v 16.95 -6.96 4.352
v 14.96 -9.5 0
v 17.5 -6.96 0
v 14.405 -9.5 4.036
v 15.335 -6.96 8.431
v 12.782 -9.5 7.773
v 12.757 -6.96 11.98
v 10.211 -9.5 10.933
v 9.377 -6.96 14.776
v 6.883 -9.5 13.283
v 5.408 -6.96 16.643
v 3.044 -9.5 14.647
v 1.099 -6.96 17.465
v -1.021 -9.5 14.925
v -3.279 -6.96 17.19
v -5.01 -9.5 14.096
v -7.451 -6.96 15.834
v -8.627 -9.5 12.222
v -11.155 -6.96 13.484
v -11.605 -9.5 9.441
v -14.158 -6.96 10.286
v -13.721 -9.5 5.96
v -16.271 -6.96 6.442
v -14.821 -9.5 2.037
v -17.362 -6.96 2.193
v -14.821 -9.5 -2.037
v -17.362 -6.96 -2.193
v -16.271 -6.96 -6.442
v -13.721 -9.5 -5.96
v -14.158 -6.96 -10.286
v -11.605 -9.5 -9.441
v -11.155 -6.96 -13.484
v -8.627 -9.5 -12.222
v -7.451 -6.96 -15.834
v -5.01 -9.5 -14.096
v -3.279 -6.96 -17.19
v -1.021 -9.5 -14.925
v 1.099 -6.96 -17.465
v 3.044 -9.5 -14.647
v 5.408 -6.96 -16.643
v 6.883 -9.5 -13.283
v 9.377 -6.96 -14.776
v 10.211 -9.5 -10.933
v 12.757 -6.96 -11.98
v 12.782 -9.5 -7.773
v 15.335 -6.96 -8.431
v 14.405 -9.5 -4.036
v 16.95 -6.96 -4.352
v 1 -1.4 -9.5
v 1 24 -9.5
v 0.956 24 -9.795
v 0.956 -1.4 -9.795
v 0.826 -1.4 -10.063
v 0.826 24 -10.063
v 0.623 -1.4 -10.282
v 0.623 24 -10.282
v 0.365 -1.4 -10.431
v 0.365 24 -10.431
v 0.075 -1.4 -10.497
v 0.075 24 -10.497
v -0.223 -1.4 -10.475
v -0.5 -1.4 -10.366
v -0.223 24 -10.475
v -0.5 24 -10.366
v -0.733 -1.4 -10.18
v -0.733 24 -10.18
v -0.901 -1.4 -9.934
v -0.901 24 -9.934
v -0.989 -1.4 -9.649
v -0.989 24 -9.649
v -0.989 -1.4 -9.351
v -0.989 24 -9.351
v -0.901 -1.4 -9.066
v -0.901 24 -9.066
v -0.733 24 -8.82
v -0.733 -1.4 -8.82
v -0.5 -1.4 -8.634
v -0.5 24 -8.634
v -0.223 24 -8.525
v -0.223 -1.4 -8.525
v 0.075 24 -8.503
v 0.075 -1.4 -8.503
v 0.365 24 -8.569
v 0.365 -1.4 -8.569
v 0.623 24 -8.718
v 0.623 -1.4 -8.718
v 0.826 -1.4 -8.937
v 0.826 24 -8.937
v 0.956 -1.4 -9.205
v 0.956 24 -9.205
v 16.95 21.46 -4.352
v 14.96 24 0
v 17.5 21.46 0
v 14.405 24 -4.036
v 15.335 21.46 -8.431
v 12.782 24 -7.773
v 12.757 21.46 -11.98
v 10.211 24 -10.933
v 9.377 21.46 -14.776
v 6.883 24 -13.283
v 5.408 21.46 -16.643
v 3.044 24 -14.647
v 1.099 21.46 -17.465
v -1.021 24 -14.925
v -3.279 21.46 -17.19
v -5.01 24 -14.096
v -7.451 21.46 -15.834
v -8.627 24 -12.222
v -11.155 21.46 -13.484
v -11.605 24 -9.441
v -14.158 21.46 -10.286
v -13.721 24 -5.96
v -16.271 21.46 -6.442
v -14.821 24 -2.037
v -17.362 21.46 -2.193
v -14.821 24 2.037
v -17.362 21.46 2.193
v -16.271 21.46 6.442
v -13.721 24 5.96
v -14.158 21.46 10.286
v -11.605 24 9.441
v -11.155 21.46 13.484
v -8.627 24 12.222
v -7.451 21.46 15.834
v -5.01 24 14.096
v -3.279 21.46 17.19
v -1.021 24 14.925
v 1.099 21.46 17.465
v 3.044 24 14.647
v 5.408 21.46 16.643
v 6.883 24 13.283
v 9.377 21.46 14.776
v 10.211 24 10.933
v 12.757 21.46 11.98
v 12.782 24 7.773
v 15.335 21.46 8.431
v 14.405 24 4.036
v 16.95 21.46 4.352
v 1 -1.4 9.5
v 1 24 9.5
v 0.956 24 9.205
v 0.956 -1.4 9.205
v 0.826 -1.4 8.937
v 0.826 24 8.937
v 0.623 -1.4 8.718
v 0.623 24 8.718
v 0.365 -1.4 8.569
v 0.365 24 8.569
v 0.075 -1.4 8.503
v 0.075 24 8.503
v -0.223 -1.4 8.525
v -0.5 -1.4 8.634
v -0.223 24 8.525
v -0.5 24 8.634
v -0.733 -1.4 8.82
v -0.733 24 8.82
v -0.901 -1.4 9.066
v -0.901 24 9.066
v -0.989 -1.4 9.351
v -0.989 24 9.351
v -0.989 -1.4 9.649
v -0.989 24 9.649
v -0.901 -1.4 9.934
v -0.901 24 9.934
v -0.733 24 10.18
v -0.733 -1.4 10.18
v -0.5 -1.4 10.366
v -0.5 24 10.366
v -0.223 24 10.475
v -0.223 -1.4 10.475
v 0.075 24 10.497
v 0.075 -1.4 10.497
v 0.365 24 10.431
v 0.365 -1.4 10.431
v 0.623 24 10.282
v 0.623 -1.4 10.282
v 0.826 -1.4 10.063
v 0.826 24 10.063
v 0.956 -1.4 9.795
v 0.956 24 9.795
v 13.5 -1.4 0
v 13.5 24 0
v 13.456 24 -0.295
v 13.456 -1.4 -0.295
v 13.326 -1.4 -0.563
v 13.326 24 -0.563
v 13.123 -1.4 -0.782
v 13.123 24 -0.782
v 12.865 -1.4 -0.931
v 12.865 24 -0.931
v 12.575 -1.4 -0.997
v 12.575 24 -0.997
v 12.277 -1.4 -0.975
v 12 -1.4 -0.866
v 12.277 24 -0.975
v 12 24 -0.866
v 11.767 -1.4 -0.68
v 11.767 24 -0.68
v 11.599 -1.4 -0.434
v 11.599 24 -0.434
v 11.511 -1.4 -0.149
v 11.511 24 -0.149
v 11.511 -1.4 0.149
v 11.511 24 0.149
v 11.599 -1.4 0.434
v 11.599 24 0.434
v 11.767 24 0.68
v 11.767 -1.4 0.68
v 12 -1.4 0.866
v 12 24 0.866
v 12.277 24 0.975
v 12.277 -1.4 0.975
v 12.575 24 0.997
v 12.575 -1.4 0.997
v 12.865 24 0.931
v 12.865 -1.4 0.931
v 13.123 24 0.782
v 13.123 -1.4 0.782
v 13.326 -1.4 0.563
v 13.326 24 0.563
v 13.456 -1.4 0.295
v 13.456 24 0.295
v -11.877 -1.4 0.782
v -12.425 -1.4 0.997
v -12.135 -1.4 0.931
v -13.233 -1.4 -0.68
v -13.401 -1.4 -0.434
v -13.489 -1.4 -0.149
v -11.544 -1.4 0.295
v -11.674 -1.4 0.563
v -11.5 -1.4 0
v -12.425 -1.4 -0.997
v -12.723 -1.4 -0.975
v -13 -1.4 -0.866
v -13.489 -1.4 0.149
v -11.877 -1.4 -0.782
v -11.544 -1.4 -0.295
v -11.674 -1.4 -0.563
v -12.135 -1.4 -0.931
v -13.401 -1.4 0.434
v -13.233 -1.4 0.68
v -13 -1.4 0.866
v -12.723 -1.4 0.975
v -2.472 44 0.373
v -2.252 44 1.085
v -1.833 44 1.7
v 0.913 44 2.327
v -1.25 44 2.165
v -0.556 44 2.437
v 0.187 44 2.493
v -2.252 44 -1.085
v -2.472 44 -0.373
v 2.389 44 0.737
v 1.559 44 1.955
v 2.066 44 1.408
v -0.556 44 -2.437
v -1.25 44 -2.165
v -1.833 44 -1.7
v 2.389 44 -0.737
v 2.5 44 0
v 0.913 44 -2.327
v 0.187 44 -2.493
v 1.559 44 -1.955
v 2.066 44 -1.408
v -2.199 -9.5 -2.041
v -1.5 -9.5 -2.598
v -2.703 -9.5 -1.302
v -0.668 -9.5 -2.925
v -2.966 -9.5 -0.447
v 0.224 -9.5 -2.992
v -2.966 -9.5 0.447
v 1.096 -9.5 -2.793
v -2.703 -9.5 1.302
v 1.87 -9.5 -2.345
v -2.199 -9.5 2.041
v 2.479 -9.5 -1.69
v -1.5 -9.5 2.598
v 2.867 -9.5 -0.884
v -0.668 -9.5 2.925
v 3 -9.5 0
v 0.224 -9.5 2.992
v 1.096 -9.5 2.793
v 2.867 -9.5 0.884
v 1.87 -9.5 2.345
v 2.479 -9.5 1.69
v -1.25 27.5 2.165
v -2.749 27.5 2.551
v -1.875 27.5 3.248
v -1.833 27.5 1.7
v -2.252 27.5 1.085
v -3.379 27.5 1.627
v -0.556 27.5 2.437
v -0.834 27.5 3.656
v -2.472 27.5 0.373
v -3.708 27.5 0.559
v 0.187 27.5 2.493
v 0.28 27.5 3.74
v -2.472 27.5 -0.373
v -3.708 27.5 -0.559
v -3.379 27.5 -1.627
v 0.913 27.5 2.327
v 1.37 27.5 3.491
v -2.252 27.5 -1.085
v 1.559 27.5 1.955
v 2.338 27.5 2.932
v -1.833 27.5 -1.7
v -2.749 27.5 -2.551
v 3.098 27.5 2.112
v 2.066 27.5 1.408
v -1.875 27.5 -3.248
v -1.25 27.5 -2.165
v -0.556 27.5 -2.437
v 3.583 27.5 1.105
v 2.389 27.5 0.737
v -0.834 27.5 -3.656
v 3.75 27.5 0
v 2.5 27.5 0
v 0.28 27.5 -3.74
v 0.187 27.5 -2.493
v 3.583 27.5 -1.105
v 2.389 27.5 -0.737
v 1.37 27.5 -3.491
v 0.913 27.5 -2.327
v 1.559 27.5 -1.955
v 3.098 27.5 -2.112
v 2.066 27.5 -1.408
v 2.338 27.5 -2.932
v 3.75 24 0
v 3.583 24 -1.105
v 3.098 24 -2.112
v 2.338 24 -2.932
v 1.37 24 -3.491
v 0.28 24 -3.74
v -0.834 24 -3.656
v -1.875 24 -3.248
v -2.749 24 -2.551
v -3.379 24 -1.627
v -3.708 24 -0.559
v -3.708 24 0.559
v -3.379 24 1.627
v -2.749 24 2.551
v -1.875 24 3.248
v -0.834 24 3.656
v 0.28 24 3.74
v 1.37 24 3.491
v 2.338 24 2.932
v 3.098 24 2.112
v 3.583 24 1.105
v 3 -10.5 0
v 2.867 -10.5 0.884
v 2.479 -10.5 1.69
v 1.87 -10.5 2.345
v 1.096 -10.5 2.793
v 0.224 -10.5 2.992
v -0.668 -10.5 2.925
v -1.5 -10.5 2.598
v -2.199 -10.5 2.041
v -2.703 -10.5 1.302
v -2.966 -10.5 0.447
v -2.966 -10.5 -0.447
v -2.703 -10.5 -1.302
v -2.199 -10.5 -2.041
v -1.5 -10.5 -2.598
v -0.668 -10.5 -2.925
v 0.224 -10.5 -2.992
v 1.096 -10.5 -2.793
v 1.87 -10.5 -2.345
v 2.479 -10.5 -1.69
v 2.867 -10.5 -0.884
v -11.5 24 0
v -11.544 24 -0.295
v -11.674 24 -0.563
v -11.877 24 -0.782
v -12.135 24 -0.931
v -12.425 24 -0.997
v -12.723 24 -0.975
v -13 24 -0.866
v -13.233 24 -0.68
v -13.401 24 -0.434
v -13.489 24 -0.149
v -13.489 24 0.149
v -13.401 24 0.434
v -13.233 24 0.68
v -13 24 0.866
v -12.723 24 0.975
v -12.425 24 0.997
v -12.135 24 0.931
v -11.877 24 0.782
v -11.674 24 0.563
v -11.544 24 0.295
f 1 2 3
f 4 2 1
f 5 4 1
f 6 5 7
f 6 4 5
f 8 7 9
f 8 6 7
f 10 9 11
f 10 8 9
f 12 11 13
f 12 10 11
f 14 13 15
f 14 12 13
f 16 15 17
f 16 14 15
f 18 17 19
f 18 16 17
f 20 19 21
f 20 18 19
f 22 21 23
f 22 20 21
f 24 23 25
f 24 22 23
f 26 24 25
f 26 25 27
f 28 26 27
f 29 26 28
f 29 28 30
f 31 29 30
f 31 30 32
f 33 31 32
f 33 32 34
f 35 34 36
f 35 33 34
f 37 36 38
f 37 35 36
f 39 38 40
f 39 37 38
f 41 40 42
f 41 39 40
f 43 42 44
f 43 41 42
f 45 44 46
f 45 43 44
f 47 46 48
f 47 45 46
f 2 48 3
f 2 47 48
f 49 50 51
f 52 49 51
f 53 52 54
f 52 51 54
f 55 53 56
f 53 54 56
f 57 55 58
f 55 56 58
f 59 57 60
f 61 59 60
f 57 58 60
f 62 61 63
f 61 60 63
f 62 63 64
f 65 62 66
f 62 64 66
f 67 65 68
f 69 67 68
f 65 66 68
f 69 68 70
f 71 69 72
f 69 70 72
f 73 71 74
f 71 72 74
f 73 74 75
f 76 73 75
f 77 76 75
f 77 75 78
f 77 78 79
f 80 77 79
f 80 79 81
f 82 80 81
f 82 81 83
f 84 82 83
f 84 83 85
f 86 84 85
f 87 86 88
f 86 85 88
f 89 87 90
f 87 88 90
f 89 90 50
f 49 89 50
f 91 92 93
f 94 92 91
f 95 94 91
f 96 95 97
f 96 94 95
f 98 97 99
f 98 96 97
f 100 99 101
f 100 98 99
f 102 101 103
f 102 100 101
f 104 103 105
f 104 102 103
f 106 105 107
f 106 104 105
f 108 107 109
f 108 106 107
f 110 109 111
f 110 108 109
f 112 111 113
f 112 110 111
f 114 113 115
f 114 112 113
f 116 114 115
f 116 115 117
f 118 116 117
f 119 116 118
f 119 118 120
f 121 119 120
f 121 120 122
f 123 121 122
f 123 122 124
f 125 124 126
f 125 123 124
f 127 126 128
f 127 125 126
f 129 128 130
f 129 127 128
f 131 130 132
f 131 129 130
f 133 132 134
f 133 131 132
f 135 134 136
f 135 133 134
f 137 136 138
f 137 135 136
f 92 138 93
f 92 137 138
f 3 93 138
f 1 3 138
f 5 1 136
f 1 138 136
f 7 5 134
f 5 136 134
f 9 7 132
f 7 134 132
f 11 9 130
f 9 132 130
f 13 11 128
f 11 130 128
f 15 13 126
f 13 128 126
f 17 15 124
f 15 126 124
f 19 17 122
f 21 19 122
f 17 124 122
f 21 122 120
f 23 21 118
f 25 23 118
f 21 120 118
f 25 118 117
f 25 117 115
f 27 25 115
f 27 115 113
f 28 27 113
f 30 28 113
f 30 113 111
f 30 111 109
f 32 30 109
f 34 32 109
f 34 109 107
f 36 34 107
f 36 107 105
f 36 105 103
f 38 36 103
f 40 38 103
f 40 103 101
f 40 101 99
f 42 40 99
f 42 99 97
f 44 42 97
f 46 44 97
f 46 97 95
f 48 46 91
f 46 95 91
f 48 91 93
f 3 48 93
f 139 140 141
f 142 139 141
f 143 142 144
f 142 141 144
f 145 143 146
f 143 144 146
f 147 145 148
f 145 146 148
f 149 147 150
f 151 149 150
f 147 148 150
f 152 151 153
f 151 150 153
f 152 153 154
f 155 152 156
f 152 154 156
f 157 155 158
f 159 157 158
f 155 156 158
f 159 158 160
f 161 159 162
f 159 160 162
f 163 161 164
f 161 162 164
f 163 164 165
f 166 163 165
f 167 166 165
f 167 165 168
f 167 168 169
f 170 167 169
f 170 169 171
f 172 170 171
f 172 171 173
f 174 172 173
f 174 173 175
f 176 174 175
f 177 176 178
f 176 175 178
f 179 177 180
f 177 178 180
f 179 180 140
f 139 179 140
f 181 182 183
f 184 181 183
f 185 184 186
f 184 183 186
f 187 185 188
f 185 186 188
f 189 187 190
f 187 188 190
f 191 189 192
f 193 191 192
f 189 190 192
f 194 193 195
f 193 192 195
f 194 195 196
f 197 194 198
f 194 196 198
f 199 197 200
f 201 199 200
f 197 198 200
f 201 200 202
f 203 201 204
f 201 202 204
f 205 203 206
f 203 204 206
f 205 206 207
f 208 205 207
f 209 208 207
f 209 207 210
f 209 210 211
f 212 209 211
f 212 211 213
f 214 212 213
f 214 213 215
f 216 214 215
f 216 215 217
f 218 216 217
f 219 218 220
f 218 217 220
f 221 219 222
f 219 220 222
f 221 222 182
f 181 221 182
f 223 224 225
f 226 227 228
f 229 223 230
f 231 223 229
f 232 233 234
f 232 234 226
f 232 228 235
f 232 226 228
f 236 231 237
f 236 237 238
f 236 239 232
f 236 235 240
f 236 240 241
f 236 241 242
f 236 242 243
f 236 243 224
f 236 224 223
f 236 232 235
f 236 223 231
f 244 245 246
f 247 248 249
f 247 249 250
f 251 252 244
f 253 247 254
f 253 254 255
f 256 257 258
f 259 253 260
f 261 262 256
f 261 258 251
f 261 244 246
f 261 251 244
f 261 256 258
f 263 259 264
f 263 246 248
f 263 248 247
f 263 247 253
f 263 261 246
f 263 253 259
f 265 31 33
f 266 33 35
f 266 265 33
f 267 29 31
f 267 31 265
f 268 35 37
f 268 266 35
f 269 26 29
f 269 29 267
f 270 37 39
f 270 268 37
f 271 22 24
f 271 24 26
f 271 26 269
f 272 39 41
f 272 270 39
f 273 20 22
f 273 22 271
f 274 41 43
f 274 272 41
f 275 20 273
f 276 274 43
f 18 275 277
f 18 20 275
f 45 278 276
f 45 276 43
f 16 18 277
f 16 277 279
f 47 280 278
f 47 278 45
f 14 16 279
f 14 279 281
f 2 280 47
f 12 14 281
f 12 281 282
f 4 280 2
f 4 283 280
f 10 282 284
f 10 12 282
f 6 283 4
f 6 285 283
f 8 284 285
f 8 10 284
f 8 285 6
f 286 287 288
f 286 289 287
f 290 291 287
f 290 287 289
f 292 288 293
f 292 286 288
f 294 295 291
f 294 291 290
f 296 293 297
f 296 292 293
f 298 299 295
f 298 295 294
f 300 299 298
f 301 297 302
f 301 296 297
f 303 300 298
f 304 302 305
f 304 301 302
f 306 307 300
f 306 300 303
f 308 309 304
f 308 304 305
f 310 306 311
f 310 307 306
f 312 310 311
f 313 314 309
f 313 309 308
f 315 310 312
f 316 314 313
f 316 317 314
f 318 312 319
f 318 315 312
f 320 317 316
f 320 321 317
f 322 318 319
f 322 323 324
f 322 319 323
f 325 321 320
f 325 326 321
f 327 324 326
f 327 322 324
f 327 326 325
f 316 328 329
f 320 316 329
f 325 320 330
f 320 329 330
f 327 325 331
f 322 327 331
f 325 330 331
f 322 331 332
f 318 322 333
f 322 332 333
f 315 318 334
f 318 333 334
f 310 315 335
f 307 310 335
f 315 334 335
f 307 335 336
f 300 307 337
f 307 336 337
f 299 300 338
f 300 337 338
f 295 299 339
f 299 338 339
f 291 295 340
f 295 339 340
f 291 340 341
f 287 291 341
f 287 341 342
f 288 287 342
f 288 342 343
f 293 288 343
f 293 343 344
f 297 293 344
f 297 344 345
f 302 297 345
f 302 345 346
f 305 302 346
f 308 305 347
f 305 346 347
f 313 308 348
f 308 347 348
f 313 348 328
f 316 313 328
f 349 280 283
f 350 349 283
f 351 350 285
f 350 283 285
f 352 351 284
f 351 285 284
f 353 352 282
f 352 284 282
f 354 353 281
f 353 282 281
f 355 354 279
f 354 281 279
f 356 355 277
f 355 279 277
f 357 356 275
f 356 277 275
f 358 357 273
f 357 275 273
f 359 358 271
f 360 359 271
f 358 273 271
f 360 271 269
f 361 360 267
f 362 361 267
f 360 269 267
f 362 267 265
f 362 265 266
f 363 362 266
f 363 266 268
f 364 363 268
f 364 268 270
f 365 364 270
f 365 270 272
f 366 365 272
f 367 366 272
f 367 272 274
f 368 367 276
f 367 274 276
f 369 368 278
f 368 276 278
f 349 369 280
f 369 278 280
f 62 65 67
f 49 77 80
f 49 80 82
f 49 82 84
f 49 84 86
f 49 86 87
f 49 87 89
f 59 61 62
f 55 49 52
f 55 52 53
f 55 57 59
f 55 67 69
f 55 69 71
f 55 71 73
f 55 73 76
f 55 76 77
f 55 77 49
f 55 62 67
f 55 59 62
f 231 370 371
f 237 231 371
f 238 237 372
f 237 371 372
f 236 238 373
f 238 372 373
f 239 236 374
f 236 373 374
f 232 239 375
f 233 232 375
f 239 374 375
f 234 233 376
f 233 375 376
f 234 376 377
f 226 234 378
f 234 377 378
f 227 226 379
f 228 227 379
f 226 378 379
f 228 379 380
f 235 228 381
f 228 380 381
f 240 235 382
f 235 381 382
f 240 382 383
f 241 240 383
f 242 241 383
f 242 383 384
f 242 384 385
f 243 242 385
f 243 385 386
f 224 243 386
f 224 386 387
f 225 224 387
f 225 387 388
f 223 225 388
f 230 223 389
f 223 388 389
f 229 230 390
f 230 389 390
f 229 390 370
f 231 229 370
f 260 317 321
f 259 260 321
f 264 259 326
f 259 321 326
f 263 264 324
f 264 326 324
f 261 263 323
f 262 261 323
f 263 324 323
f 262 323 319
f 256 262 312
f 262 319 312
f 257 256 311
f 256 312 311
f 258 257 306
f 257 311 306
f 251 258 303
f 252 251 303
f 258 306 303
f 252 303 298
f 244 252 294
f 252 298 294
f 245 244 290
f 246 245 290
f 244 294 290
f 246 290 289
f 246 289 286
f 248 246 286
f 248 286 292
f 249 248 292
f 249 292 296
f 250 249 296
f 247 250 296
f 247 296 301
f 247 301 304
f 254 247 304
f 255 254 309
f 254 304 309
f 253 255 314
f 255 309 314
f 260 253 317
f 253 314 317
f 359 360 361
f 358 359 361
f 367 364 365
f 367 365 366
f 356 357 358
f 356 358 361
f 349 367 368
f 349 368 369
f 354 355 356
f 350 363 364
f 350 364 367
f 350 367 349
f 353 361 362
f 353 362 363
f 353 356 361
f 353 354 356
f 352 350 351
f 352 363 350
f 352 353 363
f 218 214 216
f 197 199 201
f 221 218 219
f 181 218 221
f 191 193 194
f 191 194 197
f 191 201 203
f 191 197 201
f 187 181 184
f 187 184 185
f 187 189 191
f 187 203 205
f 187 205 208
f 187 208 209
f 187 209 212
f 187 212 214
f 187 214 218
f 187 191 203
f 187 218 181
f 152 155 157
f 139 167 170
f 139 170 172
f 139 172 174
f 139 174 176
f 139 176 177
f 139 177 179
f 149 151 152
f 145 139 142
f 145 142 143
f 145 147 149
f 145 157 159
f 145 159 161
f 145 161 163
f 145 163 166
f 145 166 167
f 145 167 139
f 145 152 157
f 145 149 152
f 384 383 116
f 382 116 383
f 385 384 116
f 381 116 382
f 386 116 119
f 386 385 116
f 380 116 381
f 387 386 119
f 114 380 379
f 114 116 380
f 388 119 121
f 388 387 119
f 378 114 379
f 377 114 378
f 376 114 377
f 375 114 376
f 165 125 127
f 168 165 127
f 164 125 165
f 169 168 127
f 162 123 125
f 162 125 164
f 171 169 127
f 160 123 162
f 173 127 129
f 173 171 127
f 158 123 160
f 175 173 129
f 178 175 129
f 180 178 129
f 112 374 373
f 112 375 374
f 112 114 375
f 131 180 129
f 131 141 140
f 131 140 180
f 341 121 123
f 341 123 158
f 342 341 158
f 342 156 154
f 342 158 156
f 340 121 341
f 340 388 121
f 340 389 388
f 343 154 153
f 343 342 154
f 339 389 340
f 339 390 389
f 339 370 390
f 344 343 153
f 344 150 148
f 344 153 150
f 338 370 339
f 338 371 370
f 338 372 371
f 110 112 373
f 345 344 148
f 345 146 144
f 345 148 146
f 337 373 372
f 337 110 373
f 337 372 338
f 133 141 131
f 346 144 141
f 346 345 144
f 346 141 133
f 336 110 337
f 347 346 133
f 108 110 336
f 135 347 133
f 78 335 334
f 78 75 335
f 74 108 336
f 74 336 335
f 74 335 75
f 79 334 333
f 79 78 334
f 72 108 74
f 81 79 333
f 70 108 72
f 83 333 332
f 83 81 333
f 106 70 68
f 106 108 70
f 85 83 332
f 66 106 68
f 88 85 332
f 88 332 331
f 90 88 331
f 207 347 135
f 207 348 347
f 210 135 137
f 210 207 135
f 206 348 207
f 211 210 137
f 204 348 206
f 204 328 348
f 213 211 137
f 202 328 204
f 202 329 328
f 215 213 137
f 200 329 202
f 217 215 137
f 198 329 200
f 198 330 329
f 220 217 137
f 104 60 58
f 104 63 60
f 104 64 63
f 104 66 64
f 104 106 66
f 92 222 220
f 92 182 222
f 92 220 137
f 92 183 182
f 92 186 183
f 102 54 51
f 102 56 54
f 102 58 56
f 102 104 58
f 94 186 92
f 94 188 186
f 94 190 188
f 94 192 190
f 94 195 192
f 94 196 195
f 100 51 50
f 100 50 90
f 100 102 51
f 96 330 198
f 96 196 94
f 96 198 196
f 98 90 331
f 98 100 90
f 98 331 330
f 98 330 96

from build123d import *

# Parameters (mm, degrees)
SKETCH1_R           = 17.5
BOSS_EXTRUDE1_DEPTH = 24
SKETCH2_R           = 3.75
BOSS_EXTRUDE2_DEPTH = 3.5
SKETCH3_R           = 2.5
BOSS_EXTRUDE3_DEPTH = 16.5
CHAMFER1_SIZE       = 2.54
SKETCH5_R           = 17.5
BOSS_EXTRUDE4_DEPTH = 9.5
CHAMFER2_SIZE       = 2.54
SKETCH6_R           = 3
BOSS_EXTRUDE5_DEPTH = 1
SKETCH7_R           = 1
CUT_EXTRUDE1_DEPTH  = 25.4


with BuildPart() as part:
    # Sketch1 → Boss-Extrude1 (new body)
    with BuildSketch(Plane(origin=(0, 0, 0), x_dir=(1, 0, 0), z_dir=(0, 1, 0))):
        Circle(SKETCH1_R)
    extrude(amount=BOSS_EXTRUDE1_DEPTH)

    # Sketch2 → Boss-Extrude2 (add)
    with BuildSketch(Plane(origin=(0, 24, 0), x_dir=(1, 0, 0), z_dir=(0, 1, 0))):
        Circle(SKETCH2_R)
    extrude(amount=BOSS_EXTRUDE2_DEPTH)

    # Sketch3 → Boss-Extrude3 (add)
    with BuildSketch(Plane(origin=(0, 27.5, 0), x_dir=(1, 0, 0), z_dir=(0, 1, 0))):
        Circle(SKETCH3_R)
    extrude(amount=BOSS_EXTRUDE3_DEPTH)

    # Chamfer1
    chamfer1_edges = [part.edges().sort_by_distance(p)[0] for p in [
        (-17.5, 24, 0),
    ]]
    chamfer(chamfer1_edges, length=CHAMFER1_SIZE)

    # Sketch5 → Boss-Extrude4 (add)
    with BuildSketch(Plane.XZ):
        Circle(SKETCH5_R)
    extrude(amount=BOSS_EXTRUDE4_DEPTH)

    # Chamfer2
    chamfer2_edges = [part.edges().sort_by_distance(p)[0] for p in [
        (-17.5, -9.5, 0),
    ]]
    chamfer(chamfer2_edges, length=CHAMFER2_SIZE)

    # Sketch6 → Boss-Extrude5 (add)
    with BuildSketch(Plane.XZ.offset(9.5)):
        Circle(SKETCH6_R)
    extrude(amount=BOSS_EXTRUDE5_DEPTH)

    # Sketch7 → Cut-Extrude1 (cut)
    with BuildSketch(Plane(origin=(0, 24, 0), x_dir=(1, 0, 0), z_dir=(0, 1, 0))):
        with Locations((0, 9.5)):
            Circle(SKETCH7_R)
        with Locations((12.5, 0)):
            Circle(SKETCH7_R)
        with Locations((0, -9.5)):
            Circle(SKETCH7_R)
        with Locations((-12.5, 0)):
            Circle(SKETCH7_R)
    extrude(amount=-CUT_EXTRUDE1_DEPTH, mode=Mode.SUBTRACT)


solid = part.part
